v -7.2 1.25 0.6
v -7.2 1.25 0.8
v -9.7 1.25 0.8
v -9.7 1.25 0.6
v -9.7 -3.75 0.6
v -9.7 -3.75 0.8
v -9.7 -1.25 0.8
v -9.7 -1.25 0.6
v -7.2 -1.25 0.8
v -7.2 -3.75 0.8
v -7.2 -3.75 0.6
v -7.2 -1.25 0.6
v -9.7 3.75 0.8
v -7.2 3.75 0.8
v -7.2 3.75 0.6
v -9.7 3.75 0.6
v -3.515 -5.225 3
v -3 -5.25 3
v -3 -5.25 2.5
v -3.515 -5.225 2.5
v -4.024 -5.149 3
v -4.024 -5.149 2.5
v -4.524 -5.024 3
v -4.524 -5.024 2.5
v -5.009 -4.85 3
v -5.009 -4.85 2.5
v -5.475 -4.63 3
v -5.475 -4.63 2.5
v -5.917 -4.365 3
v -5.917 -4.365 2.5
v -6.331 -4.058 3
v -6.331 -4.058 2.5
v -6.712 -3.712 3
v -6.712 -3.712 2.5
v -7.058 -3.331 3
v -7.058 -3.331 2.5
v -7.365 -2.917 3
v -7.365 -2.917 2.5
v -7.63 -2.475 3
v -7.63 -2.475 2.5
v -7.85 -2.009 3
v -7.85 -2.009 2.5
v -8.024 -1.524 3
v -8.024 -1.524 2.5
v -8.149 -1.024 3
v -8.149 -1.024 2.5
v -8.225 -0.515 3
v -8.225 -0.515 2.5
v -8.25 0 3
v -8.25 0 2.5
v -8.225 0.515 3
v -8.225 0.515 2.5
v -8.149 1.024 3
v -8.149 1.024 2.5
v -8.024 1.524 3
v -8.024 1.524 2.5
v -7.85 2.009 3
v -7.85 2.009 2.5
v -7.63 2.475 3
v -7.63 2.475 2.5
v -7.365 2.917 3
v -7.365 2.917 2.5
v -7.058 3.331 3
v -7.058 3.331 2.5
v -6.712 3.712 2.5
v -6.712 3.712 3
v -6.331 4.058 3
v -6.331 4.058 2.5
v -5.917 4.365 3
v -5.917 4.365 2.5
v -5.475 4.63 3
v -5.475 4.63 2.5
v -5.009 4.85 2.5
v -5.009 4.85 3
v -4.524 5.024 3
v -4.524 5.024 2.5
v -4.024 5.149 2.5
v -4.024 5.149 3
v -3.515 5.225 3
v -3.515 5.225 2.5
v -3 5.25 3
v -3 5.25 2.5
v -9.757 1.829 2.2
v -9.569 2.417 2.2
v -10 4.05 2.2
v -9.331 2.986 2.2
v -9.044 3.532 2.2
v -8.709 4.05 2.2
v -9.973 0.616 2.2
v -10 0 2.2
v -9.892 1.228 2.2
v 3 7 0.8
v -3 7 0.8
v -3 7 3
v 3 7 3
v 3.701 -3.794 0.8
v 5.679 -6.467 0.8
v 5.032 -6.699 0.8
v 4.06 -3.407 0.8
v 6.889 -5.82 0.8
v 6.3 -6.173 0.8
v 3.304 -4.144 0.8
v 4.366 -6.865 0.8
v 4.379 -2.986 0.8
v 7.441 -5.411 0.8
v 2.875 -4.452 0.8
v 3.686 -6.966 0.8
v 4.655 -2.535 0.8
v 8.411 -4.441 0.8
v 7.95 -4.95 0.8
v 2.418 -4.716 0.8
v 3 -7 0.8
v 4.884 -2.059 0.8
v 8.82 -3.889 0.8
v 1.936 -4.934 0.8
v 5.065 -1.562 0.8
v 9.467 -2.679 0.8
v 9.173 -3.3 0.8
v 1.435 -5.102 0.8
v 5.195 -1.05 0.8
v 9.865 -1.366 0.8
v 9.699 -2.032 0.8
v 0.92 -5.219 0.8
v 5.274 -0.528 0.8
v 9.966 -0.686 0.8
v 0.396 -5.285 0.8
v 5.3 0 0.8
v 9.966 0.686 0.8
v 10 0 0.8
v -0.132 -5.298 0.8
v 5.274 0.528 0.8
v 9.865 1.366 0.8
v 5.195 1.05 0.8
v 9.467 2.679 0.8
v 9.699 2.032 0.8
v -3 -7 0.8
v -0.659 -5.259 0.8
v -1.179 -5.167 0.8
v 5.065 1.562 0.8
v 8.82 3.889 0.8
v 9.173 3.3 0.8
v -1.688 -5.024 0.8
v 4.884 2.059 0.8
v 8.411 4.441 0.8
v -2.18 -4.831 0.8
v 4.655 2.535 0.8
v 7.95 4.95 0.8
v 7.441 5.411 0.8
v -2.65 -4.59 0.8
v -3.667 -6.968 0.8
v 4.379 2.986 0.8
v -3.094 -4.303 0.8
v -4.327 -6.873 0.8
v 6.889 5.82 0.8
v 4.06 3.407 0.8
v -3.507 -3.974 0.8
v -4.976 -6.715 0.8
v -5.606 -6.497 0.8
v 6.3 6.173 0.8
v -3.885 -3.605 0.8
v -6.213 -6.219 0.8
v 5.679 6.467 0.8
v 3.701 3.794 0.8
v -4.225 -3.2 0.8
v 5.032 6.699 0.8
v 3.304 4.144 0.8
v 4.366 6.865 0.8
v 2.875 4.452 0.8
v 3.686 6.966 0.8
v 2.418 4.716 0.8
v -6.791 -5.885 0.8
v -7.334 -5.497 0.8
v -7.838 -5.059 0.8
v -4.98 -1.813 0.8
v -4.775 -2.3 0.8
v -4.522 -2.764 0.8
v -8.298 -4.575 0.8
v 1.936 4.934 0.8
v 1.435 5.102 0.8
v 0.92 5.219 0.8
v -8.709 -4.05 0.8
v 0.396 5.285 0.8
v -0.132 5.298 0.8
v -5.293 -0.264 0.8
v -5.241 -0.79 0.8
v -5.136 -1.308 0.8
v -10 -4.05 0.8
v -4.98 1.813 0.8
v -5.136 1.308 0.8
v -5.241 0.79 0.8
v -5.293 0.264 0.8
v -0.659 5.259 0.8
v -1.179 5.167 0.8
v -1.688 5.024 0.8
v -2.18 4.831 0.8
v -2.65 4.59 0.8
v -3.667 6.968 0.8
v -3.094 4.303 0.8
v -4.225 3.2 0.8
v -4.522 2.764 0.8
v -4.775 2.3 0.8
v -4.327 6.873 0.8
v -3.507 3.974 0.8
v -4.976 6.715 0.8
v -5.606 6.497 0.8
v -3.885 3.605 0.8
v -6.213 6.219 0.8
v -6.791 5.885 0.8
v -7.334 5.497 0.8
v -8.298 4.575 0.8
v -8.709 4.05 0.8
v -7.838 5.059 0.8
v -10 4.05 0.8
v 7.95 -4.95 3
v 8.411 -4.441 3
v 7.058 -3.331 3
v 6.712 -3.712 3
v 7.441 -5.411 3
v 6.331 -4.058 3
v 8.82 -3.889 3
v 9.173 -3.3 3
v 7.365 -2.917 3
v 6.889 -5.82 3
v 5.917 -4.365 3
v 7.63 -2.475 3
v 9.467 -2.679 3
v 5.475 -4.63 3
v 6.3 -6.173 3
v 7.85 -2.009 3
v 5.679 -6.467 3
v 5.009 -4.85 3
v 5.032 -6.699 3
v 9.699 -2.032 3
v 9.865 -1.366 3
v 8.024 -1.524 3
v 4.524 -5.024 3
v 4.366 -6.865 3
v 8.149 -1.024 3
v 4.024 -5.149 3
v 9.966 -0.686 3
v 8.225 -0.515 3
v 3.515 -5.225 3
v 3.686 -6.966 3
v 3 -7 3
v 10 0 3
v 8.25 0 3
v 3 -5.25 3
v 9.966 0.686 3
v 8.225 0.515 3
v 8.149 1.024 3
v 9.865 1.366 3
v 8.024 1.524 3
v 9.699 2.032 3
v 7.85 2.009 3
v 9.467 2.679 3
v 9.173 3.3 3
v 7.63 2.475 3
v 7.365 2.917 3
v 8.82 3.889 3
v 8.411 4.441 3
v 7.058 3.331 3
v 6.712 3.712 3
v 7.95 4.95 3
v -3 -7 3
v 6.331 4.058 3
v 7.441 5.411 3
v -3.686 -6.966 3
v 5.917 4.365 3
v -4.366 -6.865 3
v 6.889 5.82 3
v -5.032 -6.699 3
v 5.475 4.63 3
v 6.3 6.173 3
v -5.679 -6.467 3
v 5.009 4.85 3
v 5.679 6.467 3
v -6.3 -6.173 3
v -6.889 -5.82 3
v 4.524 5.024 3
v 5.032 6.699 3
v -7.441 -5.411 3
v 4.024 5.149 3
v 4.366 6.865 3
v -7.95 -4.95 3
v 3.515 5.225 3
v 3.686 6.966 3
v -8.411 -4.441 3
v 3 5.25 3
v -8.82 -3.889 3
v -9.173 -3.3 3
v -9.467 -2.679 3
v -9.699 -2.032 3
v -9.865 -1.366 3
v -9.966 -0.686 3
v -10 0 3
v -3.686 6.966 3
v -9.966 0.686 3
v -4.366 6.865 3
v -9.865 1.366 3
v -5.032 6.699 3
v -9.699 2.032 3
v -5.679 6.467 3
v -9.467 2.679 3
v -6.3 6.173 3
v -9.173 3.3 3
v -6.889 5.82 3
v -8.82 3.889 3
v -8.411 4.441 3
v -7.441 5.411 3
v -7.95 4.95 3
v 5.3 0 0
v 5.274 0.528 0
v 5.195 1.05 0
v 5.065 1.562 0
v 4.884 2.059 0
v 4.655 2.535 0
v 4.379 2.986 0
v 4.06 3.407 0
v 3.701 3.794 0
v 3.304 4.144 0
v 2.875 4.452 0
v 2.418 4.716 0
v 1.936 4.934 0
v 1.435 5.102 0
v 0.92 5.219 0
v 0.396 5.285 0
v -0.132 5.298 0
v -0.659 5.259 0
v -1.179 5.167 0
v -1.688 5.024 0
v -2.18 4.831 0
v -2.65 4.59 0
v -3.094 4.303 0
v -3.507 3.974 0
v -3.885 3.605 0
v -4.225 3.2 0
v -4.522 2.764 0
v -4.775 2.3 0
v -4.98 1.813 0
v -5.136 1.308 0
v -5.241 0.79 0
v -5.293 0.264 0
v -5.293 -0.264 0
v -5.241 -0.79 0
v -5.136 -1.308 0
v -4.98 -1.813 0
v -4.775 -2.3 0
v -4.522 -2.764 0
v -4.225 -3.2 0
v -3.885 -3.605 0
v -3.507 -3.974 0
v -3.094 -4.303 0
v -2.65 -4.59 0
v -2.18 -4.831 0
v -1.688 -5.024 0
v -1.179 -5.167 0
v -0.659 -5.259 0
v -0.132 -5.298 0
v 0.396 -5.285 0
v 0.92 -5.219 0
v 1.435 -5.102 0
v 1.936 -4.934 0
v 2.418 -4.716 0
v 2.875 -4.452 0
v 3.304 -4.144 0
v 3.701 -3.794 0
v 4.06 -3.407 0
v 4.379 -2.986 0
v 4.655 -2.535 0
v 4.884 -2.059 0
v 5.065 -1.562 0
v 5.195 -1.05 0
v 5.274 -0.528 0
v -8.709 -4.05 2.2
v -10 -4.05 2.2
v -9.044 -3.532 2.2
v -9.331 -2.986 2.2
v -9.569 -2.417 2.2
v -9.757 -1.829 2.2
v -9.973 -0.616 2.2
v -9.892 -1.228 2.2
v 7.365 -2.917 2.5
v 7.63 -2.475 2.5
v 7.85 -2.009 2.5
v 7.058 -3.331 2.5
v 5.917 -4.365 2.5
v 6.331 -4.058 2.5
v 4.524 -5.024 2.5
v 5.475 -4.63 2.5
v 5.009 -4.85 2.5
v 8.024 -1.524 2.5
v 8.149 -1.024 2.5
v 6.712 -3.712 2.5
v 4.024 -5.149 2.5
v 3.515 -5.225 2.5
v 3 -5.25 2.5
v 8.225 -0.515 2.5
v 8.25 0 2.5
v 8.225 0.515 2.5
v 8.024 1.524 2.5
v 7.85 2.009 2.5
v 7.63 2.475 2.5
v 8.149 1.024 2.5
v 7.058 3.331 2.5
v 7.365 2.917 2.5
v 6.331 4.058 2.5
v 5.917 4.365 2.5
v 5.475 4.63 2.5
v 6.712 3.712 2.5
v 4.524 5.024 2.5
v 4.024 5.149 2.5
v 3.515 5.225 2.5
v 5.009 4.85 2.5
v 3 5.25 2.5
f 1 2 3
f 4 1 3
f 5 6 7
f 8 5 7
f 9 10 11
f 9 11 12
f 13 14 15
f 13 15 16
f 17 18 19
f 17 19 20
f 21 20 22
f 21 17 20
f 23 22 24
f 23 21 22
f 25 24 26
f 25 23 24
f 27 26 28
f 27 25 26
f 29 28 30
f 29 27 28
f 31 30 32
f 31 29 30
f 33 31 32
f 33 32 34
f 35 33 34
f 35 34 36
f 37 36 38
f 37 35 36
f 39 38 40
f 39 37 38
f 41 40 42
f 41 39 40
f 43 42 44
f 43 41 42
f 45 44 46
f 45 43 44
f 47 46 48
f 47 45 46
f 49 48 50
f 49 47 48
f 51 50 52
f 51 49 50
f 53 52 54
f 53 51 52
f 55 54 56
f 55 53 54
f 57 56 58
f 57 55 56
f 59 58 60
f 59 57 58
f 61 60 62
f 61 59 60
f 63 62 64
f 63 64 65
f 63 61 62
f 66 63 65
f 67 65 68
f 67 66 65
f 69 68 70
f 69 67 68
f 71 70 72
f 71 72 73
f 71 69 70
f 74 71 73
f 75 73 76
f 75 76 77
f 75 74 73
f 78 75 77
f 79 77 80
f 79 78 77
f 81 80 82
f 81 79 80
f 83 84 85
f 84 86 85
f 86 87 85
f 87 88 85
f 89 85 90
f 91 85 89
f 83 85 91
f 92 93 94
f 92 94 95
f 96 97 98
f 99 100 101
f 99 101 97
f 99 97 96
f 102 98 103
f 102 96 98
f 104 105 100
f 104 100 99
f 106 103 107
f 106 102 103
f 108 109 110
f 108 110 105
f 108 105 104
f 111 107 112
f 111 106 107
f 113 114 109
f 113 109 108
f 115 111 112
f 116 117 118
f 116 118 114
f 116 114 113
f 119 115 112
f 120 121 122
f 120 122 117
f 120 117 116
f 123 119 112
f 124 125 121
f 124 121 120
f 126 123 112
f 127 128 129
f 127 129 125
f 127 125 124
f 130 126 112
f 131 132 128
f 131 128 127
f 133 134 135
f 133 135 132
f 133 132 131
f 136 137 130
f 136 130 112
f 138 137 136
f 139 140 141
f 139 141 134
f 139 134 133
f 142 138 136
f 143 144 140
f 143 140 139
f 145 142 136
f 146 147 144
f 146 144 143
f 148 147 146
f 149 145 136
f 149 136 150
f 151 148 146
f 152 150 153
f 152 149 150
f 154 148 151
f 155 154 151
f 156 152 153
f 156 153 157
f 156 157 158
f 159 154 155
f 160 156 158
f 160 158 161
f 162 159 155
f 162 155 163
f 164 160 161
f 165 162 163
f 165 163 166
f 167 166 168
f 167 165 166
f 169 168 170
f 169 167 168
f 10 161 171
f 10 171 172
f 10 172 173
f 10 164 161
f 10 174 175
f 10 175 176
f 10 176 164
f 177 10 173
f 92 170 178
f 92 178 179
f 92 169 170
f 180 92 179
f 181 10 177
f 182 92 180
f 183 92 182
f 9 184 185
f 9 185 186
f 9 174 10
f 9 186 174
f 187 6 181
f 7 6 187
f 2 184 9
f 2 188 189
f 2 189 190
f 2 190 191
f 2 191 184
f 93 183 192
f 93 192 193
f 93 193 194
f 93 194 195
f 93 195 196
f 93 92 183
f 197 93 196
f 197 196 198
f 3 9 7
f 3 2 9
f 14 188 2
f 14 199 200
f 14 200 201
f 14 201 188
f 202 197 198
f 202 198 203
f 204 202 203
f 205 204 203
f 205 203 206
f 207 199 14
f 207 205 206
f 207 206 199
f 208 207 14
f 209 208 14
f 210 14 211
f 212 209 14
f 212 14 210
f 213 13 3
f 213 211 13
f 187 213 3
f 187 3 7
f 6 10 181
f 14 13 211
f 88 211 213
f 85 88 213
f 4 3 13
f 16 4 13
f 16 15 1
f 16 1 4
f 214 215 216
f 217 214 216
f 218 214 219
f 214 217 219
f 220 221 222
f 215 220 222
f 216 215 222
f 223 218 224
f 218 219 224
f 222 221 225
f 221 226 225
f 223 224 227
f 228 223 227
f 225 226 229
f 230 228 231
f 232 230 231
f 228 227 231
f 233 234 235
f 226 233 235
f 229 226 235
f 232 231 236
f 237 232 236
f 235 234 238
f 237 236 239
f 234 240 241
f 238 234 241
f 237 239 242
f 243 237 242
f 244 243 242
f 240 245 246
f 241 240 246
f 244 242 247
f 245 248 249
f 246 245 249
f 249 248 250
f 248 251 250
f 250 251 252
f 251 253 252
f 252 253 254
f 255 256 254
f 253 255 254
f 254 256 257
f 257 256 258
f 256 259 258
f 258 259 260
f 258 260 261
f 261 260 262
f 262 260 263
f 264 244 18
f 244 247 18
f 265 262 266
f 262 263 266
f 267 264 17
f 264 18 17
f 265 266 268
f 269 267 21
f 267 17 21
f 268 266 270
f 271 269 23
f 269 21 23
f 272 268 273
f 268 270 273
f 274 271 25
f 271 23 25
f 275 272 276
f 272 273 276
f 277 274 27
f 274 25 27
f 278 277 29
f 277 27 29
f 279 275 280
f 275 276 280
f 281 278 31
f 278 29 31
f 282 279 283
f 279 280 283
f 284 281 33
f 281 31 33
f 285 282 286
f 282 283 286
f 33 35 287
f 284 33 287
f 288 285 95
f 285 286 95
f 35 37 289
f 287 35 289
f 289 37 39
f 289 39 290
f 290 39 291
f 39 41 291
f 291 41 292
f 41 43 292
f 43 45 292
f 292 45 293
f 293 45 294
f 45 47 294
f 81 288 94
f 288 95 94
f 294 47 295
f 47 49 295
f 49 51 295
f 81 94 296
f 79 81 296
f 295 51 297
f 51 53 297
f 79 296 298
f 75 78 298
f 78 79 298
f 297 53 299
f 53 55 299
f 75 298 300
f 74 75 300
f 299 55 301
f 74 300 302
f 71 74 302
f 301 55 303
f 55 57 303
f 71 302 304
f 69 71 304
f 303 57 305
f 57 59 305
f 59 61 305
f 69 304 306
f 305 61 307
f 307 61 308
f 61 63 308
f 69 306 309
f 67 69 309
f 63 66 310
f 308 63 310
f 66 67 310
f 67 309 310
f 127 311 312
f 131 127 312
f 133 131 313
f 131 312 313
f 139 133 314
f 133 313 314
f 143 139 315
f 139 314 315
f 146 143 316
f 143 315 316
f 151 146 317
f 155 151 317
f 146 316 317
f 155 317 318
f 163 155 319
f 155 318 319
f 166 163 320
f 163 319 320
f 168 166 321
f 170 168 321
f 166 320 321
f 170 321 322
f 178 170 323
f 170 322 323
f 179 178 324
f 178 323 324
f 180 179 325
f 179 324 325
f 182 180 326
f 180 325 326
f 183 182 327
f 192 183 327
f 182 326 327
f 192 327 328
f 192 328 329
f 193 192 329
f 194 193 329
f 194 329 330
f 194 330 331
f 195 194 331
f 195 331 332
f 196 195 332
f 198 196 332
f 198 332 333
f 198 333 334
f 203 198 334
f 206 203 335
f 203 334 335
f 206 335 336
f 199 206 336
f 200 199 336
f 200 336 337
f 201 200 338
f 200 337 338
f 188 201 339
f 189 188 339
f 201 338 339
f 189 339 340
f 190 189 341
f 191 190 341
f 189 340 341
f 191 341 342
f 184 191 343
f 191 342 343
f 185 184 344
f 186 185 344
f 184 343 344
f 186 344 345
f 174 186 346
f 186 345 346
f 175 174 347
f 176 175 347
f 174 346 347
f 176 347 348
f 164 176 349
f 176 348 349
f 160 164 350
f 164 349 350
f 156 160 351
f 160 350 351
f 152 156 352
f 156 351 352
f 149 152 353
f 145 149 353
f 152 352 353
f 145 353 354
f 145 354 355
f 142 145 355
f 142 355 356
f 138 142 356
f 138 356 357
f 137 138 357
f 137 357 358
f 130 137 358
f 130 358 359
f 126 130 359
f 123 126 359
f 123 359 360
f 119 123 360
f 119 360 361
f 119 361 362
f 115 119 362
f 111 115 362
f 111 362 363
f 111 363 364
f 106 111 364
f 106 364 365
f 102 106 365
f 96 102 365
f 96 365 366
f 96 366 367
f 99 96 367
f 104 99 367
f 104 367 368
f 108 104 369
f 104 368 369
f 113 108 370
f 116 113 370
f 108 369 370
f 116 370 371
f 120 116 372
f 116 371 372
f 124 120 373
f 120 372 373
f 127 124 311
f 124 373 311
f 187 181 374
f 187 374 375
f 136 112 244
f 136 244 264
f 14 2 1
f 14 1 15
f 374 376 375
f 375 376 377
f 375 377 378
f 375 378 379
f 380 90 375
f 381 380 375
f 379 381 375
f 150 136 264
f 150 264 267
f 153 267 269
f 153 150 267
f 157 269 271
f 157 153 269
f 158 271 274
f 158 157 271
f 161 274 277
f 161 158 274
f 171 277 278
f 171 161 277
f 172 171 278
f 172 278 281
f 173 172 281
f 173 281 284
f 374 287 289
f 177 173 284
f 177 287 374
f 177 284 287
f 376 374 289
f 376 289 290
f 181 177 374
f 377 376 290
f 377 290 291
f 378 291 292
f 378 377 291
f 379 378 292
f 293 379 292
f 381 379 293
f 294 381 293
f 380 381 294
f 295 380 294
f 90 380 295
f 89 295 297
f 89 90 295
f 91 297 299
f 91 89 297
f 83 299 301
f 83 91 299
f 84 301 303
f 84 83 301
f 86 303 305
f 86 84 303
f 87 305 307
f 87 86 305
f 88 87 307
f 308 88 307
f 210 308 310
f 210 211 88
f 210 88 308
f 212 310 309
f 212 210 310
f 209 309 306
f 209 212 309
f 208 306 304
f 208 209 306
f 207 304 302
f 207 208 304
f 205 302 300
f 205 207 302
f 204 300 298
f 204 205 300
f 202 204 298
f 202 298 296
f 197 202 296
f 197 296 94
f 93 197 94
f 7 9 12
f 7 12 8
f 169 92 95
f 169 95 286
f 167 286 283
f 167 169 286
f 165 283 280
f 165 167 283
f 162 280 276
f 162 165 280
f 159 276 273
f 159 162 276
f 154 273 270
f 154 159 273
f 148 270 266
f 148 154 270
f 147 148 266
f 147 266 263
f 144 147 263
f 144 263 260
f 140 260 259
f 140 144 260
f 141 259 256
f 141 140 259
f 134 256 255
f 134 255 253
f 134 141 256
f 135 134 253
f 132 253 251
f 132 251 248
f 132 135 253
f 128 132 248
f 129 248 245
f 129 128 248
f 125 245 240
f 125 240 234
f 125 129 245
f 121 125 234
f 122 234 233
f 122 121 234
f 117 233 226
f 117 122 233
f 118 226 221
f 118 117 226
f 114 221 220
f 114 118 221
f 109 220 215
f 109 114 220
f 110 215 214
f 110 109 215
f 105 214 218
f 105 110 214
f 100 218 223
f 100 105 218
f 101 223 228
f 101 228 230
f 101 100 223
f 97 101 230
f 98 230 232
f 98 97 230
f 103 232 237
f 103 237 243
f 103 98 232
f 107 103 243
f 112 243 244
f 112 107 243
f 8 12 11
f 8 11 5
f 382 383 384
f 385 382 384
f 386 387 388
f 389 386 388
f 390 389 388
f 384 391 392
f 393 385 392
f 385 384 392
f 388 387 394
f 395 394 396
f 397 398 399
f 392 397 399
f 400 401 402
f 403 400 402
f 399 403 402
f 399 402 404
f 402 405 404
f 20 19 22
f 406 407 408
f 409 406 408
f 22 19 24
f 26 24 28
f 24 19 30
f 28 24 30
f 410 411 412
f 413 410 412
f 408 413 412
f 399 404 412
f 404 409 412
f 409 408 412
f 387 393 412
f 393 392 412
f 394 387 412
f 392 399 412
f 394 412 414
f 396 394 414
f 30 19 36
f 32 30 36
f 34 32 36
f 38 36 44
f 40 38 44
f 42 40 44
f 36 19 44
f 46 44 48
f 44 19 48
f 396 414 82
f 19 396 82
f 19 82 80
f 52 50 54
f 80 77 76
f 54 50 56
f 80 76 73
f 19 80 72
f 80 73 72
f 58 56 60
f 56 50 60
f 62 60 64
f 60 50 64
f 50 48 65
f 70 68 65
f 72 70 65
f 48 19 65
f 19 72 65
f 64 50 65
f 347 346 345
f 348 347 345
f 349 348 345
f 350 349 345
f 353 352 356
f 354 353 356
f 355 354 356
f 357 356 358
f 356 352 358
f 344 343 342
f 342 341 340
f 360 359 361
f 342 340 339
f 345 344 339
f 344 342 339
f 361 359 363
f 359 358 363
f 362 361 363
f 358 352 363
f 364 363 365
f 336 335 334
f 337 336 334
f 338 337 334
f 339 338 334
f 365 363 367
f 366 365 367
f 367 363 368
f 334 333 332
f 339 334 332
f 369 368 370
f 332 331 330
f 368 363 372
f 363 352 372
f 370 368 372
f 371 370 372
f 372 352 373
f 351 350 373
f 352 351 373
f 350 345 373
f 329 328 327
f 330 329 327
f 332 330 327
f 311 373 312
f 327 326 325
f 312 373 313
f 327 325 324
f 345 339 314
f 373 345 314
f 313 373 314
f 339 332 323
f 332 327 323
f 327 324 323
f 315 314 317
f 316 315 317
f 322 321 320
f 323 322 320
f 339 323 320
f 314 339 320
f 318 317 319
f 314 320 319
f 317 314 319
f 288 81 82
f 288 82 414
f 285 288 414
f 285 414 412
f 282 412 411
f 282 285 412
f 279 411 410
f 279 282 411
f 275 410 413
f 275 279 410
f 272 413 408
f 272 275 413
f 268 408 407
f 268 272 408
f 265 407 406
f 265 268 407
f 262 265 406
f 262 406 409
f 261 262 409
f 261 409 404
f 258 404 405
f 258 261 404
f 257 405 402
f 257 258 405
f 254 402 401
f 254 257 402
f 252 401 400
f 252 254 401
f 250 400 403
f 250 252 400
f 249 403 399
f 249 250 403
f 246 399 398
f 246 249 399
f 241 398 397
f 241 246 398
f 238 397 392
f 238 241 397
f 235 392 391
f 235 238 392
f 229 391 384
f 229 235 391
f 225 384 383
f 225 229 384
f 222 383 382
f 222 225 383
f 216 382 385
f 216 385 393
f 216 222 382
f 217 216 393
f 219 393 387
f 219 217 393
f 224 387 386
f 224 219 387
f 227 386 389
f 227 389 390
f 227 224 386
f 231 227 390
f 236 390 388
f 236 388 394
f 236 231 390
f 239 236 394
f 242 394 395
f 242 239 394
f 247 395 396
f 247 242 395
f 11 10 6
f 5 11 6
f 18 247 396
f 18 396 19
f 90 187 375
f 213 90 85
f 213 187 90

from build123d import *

# Parameters (mm, degrees)
SKETCH_1_R          = 5.3
EXTRUDE_1_DEPTH     = 0.8
EXTRUDE_2_DEPTH     = 2.2
CUT_EXTRUDE_1_DEPTH = 0.5
SKETCH_5_W          = 1.290577963
SKETCH_5_H          = 8.1
EXTRUDE_5_DEPTH     = 1.4
SKETCH_4_W          = 2.5
SKETCH_4_H          = 2.5
EXTRUDE_4_DEPTH     = 0.2


with BuildPart() as part:
    # Эскиз1 → Бобышка-Вытянуть1 (new body)
    with BuildSketch(Plane.XY):
        Circle(SKETCH_1_R)
    extrude(amount=EXTRUDE_1_DEPTH)

    # Эскиз2 → Бобышка-Вытянуть2 (add)
    with BuildSketch(Plane.XY.offset(0.8)):
        with BuildLine():
            Line((3, -7), (-3, -7))
            ThreePointArc((-3, -7), (-10, 0), (-3, 7))
            Line((-3, 7), (3, 7))
            ThreePointArc((3, 7), (10, 0), (3, -7))
        make_face()
    extrude(amount=EXTRUDE_2_DEPTH)

    # Эскиз3 → Вырез-Вытянуть1 (cut)
    with BuildSketch(Plane.XY.offset(3)):
        with BuildLine():
            Line((-3, 5.25), (3, 5.25))
            ThreePointArc((3, 5.25), (8.25, 0), (3, -5.25))
            Line((3, -5.25), (-3, -5.25))
            ThreePointArc((-3, -5.25), (-8.25, 0), (-3, 5.25))
        make_face()
    extrude(amount=-CUT_EXTRUDE_1_DEPTH, mode=Mode.SUBTRACT)

    # Эскиз5 → Бобышка-Вытянуть5 (add)
    with BuildSketch(Plane(origin=(0, 0, 0.8), x_dir=(-1, 0, 0), z_dir=(0, 0, -1))):
        with Locations((9.354711019, 0)):
            Rectangle(SKETCH_5_W, SKETCH_5_H)
    extrude(amount=-EXTRUDE_5_DEPTH)

    # Эскиз4 → Бобышка-Вытянуть4 (add)
    with BuildSketch(Plane(origin=(0, 0, 0.8), x_dir=(-1, 0, 0), z_dir=(0, 0, -1))):
        with Locations((8.45, 2.5)):
            Rectangle(SKETCH_4_W, SKETCH_4_H)
        with Locations((8.45, -2.5)):
            Rectangle(SKETCH_4_W, SKETCH_4_H)
    extrude(amount=EXTRUDE_4_DEPTH)


solid = part.part
